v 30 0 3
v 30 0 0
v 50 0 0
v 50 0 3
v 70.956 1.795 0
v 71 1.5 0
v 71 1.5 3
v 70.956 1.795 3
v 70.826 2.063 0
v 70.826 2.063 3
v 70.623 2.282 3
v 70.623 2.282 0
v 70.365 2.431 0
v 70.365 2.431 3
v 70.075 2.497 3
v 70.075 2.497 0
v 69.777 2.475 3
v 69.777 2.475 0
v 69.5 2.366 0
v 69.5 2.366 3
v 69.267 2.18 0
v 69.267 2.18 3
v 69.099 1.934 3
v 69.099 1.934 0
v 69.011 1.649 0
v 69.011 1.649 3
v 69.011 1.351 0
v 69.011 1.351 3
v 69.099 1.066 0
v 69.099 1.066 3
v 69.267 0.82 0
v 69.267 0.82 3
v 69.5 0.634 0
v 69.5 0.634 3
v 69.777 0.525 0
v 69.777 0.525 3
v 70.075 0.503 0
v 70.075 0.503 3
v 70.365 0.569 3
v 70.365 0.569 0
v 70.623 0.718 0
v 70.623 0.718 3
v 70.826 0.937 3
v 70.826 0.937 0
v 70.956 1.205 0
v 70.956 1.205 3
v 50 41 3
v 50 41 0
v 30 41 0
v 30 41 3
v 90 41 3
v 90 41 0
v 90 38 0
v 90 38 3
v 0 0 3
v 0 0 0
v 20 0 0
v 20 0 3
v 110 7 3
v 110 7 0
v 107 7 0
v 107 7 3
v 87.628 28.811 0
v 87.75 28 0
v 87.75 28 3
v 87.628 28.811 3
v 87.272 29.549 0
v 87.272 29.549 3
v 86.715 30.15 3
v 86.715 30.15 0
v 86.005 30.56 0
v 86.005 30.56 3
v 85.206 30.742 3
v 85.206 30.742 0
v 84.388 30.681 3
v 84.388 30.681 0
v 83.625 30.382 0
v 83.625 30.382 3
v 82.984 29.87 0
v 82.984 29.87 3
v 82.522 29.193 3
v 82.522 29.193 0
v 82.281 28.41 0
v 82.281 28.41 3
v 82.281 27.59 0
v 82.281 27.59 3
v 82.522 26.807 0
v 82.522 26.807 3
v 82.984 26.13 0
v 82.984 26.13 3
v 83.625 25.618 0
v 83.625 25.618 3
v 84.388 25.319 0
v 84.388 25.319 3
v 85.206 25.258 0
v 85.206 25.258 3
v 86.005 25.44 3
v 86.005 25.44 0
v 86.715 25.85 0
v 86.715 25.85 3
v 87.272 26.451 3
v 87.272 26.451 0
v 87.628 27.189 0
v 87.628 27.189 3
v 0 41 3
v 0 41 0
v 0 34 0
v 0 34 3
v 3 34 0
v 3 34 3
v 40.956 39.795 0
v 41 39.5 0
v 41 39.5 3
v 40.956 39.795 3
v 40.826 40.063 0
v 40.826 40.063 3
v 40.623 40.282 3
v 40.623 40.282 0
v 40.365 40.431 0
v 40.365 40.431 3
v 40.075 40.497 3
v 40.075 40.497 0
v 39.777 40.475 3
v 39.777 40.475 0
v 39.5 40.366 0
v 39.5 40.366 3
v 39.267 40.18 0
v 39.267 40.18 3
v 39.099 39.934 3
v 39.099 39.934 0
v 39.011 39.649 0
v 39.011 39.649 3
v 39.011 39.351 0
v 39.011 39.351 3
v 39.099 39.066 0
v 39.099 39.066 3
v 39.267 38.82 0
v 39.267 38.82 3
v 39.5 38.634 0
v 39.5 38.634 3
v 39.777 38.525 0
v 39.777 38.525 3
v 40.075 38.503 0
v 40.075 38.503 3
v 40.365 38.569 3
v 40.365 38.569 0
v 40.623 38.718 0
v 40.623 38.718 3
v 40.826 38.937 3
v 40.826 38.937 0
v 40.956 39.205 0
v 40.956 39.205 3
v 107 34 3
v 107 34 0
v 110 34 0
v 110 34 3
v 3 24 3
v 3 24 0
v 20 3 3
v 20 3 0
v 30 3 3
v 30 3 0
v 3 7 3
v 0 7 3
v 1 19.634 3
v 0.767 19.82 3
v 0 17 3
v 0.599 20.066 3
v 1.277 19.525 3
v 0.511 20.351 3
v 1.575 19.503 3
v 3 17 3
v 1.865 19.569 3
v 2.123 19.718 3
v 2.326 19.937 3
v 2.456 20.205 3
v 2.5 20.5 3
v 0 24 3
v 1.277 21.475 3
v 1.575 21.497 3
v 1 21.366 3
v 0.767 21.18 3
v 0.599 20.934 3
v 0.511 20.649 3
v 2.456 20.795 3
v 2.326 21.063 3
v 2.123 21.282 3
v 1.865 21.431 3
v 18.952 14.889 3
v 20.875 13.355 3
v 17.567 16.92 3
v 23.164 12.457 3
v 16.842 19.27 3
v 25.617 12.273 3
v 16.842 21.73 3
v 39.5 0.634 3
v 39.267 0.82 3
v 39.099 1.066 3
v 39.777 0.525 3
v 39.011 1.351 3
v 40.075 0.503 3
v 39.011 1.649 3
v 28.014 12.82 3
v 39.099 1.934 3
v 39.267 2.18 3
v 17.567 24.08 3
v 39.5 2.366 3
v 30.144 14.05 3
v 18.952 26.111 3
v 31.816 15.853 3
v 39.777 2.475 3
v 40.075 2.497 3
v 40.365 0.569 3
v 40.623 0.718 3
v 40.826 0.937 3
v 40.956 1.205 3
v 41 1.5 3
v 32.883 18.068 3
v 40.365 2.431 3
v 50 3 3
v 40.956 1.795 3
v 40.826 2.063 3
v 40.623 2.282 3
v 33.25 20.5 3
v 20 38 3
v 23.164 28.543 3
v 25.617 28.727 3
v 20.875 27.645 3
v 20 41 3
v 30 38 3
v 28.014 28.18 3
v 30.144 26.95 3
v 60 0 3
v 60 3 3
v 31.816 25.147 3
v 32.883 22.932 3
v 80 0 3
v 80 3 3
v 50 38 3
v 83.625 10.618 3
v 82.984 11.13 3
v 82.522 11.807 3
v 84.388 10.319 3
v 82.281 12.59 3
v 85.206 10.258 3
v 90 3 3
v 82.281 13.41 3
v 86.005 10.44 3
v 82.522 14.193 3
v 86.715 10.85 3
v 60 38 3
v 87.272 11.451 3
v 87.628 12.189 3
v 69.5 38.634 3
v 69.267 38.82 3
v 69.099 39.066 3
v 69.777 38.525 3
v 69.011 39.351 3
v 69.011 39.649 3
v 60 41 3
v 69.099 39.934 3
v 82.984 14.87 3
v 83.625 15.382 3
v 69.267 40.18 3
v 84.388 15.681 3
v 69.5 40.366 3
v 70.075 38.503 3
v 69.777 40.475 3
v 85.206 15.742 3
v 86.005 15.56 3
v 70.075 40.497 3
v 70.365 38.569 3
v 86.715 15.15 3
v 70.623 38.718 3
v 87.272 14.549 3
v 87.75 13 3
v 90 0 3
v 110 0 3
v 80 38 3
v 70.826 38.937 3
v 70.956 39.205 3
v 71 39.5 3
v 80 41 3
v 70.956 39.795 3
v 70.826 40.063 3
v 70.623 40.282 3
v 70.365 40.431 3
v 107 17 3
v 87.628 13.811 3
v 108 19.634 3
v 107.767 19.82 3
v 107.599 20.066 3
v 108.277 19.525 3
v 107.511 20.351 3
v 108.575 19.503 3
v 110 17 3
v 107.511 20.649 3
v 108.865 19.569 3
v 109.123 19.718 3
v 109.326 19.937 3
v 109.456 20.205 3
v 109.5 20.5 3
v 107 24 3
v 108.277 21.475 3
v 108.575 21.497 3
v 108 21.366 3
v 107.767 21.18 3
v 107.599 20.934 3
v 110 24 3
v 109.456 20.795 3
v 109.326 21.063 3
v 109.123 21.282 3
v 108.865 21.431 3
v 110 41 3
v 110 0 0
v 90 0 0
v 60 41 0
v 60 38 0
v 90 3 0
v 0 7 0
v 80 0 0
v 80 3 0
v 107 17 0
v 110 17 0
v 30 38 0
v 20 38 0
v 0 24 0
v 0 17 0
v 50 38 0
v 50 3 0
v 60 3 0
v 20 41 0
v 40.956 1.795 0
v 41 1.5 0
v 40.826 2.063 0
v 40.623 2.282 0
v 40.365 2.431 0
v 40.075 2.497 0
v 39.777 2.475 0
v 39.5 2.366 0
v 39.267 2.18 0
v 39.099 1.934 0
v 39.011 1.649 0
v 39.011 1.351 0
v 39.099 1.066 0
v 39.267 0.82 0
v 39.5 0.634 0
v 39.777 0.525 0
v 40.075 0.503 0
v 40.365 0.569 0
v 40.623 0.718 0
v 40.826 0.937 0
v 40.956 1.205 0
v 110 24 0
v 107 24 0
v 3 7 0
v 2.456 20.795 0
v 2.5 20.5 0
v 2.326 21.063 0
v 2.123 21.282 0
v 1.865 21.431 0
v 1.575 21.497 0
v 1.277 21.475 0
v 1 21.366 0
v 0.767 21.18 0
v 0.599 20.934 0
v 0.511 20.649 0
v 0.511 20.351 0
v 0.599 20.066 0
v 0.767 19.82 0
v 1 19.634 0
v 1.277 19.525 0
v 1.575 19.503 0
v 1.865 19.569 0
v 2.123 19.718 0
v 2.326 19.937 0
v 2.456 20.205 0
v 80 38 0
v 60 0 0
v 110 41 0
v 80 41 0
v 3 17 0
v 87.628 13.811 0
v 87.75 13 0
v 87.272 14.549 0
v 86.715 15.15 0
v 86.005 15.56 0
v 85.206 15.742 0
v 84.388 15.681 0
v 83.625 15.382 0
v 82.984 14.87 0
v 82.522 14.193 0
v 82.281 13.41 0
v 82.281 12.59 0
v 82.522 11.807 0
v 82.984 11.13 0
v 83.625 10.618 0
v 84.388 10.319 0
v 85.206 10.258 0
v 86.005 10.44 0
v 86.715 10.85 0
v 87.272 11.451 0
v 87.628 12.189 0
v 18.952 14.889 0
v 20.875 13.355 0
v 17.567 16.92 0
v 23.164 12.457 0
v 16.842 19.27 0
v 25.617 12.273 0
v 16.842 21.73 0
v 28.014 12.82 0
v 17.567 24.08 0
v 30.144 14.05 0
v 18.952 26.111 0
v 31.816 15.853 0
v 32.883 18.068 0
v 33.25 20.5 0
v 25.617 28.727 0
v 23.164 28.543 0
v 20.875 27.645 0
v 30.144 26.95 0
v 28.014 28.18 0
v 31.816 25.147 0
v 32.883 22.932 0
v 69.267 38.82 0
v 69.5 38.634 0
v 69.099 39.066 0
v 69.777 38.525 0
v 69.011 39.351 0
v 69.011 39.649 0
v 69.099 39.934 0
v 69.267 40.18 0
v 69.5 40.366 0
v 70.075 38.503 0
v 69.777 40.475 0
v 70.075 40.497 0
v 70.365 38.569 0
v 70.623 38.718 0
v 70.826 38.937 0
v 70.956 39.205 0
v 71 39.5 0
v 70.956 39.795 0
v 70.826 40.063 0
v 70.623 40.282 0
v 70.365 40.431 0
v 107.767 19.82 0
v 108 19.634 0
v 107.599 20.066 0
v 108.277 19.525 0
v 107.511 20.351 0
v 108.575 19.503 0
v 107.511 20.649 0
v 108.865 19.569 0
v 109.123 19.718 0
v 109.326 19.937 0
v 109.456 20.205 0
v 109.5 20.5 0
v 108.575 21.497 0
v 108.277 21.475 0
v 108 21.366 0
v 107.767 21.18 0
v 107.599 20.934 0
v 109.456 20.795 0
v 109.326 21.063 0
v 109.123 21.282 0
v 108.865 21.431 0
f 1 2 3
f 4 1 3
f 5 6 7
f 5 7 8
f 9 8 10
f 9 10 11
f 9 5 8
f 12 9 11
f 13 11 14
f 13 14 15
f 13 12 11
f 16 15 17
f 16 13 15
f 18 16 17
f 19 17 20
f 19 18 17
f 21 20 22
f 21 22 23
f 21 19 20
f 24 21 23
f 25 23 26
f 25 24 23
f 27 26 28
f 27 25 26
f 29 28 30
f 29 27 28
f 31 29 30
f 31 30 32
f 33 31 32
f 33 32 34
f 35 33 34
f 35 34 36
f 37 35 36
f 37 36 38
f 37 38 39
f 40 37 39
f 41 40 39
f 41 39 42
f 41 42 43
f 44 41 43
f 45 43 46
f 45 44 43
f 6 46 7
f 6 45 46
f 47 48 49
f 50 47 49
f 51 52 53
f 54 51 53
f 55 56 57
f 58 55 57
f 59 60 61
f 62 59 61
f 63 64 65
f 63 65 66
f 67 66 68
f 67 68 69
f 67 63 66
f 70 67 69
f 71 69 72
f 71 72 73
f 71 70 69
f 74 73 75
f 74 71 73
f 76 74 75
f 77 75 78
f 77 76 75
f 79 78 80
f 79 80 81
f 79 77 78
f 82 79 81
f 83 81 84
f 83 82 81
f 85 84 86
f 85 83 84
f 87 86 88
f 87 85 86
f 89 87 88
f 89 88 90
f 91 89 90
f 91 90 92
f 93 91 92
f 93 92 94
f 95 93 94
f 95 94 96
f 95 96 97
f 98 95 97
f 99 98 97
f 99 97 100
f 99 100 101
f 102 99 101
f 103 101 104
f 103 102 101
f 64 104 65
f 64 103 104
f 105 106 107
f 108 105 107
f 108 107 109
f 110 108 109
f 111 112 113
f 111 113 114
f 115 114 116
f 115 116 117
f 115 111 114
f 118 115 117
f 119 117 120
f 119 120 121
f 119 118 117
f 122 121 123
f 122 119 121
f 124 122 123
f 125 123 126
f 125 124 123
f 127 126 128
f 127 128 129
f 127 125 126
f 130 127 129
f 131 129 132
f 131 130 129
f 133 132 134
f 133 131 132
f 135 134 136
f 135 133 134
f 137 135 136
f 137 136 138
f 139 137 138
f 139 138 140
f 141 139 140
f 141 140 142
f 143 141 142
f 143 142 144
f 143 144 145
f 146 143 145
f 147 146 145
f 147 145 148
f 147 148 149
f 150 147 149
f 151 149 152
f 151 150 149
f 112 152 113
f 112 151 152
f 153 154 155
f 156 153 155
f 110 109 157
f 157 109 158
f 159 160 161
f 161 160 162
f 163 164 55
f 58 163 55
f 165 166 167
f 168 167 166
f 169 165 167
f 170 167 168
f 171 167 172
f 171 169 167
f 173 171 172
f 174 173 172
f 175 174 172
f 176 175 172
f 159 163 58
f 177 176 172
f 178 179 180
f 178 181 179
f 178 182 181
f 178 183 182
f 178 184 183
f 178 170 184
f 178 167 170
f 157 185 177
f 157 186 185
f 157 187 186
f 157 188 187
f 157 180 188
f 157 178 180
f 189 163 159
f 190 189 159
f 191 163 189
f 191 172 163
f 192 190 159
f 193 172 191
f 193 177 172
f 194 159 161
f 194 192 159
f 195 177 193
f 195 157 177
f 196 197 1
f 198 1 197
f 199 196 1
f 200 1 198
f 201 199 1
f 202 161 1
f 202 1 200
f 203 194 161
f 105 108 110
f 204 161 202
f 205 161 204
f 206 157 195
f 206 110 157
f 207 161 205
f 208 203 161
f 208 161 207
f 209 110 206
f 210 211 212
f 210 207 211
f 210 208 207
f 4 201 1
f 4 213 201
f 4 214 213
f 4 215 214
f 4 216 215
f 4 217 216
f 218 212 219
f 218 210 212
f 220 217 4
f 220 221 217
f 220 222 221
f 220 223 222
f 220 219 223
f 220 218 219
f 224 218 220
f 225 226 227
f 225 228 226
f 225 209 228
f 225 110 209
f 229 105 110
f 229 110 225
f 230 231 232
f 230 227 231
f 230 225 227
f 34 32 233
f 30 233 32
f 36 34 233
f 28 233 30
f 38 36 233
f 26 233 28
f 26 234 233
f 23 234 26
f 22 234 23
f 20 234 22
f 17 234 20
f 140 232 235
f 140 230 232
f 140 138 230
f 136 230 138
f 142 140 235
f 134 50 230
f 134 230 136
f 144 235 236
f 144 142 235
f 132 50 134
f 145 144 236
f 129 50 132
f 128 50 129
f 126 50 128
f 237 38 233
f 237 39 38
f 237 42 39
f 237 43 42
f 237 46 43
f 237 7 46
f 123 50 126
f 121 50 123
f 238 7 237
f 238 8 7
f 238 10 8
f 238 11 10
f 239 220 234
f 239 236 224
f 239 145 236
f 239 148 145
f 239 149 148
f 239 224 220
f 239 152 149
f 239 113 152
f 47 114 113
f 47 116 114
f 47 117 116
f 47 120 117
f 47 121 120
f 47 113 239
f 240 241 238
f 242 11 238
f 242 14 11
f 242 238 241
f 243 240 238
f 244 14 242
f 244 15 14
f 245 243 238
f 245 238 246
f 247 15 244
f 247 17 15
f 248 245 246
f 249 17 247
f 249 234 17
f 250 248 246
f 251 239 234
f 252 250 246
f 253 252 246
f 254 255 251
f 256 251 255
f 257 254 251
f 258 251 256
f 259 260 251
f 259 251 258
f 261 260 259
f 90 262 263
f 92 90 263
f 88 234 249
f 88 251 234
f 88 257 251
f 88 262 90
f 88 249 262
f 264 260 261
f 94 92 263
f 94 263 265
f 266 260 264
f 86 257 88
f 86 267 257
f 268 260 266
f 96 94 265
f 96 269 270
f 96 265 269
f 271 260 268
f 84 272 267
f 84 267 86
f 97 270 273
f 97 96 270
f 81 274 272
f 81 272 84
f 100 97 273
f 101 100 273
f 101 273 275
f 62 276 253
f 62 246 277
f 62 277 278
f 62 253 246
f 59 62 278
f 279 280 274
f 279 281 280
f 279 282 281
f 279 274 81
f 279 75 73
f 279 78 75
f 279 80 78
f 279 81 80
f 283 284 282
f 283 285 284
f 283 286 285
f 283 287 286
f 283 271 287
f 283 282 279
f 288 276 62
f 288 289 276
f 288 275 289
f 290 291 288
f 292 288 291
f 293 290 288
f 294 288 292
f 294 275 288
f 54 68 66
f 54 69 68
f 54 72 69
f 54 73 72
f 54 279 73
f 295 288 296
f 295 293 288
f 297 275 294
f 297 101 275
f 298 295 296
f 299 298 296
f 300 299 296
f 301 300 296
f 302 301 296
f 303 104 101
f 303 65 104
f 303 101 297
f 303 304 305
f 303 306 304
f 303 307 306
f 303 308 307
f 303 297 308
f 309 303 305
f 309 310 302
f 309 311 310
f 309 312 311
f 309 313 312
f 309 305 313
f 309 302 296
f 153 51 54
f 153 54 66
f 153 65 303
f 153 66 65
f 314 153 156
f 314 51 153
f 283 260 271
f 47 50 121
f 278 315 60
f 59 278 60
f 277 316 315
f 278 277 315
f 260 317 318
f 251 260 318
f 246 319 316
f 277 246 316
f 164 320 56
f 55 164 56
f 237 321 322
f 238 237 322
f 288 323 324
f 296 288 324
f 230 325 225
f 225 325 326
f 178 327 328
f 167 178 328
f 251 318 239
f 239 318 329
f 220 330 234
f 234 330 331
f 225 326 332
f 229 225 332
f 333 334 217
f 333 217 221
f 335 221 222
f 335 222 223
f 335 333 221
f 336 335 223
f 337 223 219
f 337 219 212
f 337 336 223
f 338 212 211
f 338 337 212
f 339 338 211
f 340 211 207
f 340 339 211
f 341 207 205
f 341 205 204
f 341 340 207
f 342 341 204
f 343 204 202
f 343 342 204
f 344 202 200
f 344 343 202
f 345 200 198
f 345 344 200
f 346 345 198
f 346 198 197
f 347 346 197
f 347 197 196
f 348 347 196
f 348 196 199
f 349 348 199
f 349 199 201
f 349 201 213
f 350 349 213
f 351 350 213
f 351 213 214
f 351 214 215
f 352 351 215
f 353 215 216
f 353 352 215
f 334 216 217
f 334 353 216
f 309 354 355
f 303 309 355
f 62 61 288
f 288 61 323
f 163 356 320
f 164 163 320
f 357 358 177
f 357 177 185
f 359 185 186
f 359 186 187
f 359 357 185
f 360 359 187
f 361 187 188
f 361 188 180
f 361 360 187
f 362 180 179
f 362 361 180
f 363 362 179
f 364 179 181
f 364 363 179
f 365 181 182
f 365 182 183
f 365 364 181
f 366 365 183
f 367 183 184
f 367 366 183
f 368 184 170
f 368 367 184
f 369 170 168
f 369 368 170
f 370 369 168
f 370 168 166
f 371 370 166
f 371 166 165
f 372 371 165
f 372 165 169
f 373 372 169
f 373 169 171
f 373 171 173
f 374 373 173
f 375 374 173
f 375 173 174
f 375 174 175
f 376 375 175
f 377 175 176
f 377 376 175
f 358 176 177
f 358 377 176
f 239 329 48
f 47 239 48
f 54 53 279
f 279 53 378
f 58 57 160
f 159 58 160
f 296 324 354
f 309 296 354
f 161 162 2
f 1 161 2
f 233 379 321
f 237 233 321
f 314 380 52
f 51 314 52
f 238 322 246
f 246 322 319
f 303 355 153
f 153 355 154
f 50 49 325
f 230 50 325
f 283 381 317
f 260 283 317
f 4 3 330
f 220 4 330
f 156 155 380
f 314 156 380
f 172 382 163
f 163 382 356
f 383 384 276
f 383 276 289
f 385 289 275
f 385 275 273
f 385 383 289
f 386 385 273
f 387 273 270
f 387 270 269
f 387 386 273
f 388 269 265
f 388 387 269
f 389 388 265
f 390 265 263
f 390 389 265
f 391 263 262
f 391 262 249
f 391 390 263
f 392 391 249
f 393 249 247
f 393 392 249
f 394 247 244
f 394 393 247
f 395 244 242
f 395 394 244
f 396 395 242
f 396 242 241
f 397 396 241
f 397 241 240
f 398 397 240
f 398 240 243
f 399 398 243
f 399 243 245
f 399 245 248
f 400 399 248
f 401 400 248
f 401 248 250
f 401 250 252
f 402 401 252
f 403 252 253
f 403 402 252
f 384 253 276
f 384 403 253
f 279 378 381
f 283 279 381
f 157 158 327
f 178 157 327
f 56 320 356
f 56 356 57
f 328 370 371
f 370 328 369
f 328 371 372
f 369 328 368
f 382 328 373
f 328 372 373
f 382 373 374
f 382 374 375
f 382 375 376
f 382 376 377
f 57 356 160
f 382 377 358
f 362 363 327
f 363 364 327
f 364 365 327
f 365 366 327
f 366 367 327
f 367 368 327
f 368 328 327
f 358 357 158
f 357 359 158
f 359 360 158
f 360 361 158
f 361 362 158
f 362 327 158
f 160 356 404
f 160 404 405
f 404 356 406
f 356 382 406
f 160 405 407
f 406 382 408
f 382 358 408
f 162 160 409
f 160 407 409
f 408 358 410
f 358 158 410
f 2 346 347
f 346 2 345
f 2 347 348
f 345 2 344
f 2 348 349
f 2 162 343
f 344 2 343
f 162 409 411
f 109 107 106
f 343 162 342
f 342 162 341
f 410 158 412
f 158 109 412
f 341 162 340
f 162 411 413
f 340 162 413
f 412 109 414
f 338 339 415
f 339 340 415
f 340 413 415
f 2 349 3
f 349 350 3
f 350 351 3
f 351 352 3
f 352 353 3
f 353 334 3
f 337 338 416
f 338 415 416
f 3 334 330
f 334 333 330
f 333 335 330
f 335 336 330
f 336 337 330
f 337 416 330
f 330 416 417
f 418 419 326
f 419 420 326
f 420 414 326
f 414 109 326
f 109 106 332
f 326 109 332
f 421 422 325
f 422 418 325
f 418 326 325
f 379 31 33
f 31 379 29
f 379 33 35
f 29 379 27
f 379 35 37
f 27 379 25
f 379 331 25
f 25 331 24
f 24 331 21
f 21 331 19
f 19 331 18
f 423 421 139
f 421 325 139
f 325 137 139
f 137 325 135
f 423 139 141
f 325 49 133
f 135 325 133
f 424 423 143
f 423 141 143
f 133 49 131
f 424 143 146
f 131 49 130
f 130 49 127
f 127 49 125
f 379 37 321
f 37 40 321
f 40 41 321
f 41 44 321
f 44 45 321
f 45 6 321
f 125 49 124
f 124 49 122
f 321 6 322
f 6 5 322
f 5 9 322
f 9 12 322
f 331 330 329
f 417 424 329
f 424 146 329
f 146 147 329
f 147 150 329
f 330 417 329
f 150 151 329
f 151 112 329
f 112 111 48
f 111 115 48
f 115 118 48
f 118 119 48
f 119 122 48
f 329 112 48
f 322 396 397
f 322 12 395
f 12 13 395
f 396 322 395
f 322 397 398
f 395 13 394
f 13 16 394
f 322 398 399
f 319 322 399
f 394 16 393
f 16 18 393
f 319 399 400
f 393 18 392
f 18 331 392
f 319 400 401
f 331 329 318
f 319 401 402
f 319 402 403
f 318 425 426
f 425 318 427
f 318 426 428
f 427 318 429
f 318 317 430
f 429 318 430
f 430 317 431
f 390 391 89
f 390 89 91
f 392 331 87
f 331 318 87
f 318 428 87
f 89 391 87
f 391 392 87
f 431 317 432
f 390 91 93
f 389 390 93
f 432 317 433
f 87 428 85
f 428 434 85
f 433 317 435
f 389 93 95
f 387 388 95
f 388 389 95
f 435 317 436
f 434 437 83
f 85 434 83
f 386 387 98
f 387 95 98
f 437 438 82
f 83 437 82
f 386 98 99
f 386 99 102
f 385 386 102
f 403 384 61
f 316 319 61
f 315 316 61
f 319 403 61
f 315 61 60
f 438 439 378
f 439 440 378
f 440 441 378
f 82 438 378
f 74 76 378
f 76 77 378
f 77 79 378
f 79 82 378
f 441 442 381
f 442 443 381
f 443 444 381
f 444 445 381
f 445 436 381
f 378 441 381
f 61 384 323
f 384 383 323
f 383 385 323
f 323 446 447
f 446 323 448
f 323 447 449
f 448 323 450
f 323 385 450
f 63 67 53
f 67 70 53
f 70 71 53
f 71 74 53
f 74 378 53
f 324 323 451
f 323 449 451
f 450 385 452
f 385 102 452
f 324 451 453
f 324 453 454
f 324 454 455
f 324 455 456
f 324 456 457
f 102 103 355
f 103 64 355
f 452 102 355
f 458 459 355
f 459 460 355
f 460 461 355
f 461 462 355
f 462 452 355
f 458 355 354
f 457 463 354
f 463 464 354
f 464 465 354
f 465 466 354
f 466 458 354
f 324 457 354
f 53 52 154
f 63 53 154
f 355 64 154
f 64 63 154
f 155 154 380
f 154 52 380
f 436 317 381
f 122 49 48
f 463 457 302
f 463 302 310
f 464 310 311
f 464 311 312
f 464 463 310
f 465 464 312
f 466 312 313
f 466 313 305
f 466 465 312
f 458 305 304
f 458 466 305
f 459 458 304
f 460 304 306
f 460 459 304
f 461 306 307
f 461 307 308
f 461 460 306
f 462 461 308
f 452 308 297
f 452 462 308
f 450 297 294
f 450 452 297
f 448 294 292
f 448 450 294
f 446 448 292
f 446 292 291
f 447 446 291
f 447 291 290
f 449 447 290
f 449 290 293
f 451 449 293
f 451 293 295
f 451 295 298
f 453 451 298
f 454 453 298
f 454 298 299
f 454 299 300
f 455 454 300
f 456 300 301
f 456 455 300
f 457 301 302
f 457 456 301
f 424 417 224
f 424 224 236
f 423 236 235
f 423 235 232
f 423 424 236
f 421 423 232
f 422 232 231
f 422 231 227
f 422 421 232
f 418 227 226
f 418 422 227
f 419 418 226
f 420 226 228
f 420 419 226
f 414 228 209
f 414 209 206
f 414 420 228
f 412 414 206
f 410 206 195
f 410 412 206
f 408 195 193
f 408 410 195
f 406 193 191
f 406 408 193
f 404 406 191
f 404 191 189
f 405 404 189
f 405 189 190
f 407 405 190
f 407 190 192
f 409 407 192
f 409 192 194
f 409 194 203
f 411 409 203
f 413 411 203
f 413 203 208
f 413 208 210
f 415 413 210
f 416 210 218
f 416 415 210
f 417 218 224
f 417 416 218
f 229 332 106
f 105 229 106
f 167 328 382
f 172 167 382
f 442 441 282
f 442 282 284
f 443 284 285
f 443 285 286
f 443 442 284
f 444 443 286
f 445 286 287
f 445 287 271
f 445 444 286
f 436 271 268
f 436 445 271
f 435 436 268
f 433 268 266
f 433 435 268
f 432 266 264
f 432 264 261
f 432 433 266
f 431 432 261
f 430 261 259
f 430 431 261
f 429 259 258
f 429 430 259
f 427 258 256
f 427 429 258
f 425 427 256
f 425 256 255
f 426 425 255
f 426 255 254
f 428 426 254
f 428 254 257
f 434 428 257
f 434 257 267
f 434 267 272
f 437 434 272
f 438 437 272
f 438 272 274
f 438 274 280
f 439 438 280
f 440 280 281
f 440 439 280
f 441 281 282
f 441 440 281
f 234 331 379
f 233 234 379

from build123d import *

# Parameters (mm, degrees)
F0_R     = 1
F0_R_2   = 2.75
F0_R_3   = 8.25
F1_DEPTH = 3


with BuildPart() as f1:
    # F0 (on Top) → F1 (new body)
    with BuildSketch(Plane.XY):
        Polygon((0, 7), (0, 0), (20, 0), (20, 3), (30, 3), (30, 0), (50, 0), (50, 3), (55, 3), (60, 3), (60, 0), (80, 0), (80, 3), (90, 3), (90, 0), (110, 0), (110, 7), (107, 7), (107, 17), (110, 17), (110, 24), (107, 24), (107, 34), (110, 34), (110, 41), (90, 41), (90, 38), (80, 38), (80, 41), (60, 41), (60, 38), (55, 38), (50, 38), (50, 41), (30, 41), (30, 38), (20, 38), (20, 41), (0, 41), (0, 34), (3, 34), (3, 24), (0, 24), (0, 17), (3, 17), (3, 7), align=None)
        with Locations((40, 1.5)):
            Circle(F0_R, mode=Mode.SUBTRACT)
        with Locations((70, 1.5)):
            Circle(F0_R, mode=Mode.SUBTRACT)
        with Locations((85, 13)):
            Circle(F0_R_2, mode=Mode.SUBTRACT)
        with Locations((1.5, 20.5)):
            Circle(F0_R, mode=Mode.SUBTRACT)
        with Locations((25, 20.5)):
            Circle(F0_R_3, mode=Mode.SUBTRACT)
        with Locations((40, 39.5)):
            Circle(F0_R, mode=Mode.SUBTRACT)
        with Locations((108.5, 20.5)):
            Circle(F0_R, mode=Mode.SUBTRACT)
        with Locations((85, 28)):
            Circle(F0_R_2, mode=Mode.SUBTRACT)
        with Locations((70, 39.5)):
            Circle(F0_R, mode=Mode.SUBTRACT)
    extrude(amount=F1_DEPTH)


solid = f1.part
